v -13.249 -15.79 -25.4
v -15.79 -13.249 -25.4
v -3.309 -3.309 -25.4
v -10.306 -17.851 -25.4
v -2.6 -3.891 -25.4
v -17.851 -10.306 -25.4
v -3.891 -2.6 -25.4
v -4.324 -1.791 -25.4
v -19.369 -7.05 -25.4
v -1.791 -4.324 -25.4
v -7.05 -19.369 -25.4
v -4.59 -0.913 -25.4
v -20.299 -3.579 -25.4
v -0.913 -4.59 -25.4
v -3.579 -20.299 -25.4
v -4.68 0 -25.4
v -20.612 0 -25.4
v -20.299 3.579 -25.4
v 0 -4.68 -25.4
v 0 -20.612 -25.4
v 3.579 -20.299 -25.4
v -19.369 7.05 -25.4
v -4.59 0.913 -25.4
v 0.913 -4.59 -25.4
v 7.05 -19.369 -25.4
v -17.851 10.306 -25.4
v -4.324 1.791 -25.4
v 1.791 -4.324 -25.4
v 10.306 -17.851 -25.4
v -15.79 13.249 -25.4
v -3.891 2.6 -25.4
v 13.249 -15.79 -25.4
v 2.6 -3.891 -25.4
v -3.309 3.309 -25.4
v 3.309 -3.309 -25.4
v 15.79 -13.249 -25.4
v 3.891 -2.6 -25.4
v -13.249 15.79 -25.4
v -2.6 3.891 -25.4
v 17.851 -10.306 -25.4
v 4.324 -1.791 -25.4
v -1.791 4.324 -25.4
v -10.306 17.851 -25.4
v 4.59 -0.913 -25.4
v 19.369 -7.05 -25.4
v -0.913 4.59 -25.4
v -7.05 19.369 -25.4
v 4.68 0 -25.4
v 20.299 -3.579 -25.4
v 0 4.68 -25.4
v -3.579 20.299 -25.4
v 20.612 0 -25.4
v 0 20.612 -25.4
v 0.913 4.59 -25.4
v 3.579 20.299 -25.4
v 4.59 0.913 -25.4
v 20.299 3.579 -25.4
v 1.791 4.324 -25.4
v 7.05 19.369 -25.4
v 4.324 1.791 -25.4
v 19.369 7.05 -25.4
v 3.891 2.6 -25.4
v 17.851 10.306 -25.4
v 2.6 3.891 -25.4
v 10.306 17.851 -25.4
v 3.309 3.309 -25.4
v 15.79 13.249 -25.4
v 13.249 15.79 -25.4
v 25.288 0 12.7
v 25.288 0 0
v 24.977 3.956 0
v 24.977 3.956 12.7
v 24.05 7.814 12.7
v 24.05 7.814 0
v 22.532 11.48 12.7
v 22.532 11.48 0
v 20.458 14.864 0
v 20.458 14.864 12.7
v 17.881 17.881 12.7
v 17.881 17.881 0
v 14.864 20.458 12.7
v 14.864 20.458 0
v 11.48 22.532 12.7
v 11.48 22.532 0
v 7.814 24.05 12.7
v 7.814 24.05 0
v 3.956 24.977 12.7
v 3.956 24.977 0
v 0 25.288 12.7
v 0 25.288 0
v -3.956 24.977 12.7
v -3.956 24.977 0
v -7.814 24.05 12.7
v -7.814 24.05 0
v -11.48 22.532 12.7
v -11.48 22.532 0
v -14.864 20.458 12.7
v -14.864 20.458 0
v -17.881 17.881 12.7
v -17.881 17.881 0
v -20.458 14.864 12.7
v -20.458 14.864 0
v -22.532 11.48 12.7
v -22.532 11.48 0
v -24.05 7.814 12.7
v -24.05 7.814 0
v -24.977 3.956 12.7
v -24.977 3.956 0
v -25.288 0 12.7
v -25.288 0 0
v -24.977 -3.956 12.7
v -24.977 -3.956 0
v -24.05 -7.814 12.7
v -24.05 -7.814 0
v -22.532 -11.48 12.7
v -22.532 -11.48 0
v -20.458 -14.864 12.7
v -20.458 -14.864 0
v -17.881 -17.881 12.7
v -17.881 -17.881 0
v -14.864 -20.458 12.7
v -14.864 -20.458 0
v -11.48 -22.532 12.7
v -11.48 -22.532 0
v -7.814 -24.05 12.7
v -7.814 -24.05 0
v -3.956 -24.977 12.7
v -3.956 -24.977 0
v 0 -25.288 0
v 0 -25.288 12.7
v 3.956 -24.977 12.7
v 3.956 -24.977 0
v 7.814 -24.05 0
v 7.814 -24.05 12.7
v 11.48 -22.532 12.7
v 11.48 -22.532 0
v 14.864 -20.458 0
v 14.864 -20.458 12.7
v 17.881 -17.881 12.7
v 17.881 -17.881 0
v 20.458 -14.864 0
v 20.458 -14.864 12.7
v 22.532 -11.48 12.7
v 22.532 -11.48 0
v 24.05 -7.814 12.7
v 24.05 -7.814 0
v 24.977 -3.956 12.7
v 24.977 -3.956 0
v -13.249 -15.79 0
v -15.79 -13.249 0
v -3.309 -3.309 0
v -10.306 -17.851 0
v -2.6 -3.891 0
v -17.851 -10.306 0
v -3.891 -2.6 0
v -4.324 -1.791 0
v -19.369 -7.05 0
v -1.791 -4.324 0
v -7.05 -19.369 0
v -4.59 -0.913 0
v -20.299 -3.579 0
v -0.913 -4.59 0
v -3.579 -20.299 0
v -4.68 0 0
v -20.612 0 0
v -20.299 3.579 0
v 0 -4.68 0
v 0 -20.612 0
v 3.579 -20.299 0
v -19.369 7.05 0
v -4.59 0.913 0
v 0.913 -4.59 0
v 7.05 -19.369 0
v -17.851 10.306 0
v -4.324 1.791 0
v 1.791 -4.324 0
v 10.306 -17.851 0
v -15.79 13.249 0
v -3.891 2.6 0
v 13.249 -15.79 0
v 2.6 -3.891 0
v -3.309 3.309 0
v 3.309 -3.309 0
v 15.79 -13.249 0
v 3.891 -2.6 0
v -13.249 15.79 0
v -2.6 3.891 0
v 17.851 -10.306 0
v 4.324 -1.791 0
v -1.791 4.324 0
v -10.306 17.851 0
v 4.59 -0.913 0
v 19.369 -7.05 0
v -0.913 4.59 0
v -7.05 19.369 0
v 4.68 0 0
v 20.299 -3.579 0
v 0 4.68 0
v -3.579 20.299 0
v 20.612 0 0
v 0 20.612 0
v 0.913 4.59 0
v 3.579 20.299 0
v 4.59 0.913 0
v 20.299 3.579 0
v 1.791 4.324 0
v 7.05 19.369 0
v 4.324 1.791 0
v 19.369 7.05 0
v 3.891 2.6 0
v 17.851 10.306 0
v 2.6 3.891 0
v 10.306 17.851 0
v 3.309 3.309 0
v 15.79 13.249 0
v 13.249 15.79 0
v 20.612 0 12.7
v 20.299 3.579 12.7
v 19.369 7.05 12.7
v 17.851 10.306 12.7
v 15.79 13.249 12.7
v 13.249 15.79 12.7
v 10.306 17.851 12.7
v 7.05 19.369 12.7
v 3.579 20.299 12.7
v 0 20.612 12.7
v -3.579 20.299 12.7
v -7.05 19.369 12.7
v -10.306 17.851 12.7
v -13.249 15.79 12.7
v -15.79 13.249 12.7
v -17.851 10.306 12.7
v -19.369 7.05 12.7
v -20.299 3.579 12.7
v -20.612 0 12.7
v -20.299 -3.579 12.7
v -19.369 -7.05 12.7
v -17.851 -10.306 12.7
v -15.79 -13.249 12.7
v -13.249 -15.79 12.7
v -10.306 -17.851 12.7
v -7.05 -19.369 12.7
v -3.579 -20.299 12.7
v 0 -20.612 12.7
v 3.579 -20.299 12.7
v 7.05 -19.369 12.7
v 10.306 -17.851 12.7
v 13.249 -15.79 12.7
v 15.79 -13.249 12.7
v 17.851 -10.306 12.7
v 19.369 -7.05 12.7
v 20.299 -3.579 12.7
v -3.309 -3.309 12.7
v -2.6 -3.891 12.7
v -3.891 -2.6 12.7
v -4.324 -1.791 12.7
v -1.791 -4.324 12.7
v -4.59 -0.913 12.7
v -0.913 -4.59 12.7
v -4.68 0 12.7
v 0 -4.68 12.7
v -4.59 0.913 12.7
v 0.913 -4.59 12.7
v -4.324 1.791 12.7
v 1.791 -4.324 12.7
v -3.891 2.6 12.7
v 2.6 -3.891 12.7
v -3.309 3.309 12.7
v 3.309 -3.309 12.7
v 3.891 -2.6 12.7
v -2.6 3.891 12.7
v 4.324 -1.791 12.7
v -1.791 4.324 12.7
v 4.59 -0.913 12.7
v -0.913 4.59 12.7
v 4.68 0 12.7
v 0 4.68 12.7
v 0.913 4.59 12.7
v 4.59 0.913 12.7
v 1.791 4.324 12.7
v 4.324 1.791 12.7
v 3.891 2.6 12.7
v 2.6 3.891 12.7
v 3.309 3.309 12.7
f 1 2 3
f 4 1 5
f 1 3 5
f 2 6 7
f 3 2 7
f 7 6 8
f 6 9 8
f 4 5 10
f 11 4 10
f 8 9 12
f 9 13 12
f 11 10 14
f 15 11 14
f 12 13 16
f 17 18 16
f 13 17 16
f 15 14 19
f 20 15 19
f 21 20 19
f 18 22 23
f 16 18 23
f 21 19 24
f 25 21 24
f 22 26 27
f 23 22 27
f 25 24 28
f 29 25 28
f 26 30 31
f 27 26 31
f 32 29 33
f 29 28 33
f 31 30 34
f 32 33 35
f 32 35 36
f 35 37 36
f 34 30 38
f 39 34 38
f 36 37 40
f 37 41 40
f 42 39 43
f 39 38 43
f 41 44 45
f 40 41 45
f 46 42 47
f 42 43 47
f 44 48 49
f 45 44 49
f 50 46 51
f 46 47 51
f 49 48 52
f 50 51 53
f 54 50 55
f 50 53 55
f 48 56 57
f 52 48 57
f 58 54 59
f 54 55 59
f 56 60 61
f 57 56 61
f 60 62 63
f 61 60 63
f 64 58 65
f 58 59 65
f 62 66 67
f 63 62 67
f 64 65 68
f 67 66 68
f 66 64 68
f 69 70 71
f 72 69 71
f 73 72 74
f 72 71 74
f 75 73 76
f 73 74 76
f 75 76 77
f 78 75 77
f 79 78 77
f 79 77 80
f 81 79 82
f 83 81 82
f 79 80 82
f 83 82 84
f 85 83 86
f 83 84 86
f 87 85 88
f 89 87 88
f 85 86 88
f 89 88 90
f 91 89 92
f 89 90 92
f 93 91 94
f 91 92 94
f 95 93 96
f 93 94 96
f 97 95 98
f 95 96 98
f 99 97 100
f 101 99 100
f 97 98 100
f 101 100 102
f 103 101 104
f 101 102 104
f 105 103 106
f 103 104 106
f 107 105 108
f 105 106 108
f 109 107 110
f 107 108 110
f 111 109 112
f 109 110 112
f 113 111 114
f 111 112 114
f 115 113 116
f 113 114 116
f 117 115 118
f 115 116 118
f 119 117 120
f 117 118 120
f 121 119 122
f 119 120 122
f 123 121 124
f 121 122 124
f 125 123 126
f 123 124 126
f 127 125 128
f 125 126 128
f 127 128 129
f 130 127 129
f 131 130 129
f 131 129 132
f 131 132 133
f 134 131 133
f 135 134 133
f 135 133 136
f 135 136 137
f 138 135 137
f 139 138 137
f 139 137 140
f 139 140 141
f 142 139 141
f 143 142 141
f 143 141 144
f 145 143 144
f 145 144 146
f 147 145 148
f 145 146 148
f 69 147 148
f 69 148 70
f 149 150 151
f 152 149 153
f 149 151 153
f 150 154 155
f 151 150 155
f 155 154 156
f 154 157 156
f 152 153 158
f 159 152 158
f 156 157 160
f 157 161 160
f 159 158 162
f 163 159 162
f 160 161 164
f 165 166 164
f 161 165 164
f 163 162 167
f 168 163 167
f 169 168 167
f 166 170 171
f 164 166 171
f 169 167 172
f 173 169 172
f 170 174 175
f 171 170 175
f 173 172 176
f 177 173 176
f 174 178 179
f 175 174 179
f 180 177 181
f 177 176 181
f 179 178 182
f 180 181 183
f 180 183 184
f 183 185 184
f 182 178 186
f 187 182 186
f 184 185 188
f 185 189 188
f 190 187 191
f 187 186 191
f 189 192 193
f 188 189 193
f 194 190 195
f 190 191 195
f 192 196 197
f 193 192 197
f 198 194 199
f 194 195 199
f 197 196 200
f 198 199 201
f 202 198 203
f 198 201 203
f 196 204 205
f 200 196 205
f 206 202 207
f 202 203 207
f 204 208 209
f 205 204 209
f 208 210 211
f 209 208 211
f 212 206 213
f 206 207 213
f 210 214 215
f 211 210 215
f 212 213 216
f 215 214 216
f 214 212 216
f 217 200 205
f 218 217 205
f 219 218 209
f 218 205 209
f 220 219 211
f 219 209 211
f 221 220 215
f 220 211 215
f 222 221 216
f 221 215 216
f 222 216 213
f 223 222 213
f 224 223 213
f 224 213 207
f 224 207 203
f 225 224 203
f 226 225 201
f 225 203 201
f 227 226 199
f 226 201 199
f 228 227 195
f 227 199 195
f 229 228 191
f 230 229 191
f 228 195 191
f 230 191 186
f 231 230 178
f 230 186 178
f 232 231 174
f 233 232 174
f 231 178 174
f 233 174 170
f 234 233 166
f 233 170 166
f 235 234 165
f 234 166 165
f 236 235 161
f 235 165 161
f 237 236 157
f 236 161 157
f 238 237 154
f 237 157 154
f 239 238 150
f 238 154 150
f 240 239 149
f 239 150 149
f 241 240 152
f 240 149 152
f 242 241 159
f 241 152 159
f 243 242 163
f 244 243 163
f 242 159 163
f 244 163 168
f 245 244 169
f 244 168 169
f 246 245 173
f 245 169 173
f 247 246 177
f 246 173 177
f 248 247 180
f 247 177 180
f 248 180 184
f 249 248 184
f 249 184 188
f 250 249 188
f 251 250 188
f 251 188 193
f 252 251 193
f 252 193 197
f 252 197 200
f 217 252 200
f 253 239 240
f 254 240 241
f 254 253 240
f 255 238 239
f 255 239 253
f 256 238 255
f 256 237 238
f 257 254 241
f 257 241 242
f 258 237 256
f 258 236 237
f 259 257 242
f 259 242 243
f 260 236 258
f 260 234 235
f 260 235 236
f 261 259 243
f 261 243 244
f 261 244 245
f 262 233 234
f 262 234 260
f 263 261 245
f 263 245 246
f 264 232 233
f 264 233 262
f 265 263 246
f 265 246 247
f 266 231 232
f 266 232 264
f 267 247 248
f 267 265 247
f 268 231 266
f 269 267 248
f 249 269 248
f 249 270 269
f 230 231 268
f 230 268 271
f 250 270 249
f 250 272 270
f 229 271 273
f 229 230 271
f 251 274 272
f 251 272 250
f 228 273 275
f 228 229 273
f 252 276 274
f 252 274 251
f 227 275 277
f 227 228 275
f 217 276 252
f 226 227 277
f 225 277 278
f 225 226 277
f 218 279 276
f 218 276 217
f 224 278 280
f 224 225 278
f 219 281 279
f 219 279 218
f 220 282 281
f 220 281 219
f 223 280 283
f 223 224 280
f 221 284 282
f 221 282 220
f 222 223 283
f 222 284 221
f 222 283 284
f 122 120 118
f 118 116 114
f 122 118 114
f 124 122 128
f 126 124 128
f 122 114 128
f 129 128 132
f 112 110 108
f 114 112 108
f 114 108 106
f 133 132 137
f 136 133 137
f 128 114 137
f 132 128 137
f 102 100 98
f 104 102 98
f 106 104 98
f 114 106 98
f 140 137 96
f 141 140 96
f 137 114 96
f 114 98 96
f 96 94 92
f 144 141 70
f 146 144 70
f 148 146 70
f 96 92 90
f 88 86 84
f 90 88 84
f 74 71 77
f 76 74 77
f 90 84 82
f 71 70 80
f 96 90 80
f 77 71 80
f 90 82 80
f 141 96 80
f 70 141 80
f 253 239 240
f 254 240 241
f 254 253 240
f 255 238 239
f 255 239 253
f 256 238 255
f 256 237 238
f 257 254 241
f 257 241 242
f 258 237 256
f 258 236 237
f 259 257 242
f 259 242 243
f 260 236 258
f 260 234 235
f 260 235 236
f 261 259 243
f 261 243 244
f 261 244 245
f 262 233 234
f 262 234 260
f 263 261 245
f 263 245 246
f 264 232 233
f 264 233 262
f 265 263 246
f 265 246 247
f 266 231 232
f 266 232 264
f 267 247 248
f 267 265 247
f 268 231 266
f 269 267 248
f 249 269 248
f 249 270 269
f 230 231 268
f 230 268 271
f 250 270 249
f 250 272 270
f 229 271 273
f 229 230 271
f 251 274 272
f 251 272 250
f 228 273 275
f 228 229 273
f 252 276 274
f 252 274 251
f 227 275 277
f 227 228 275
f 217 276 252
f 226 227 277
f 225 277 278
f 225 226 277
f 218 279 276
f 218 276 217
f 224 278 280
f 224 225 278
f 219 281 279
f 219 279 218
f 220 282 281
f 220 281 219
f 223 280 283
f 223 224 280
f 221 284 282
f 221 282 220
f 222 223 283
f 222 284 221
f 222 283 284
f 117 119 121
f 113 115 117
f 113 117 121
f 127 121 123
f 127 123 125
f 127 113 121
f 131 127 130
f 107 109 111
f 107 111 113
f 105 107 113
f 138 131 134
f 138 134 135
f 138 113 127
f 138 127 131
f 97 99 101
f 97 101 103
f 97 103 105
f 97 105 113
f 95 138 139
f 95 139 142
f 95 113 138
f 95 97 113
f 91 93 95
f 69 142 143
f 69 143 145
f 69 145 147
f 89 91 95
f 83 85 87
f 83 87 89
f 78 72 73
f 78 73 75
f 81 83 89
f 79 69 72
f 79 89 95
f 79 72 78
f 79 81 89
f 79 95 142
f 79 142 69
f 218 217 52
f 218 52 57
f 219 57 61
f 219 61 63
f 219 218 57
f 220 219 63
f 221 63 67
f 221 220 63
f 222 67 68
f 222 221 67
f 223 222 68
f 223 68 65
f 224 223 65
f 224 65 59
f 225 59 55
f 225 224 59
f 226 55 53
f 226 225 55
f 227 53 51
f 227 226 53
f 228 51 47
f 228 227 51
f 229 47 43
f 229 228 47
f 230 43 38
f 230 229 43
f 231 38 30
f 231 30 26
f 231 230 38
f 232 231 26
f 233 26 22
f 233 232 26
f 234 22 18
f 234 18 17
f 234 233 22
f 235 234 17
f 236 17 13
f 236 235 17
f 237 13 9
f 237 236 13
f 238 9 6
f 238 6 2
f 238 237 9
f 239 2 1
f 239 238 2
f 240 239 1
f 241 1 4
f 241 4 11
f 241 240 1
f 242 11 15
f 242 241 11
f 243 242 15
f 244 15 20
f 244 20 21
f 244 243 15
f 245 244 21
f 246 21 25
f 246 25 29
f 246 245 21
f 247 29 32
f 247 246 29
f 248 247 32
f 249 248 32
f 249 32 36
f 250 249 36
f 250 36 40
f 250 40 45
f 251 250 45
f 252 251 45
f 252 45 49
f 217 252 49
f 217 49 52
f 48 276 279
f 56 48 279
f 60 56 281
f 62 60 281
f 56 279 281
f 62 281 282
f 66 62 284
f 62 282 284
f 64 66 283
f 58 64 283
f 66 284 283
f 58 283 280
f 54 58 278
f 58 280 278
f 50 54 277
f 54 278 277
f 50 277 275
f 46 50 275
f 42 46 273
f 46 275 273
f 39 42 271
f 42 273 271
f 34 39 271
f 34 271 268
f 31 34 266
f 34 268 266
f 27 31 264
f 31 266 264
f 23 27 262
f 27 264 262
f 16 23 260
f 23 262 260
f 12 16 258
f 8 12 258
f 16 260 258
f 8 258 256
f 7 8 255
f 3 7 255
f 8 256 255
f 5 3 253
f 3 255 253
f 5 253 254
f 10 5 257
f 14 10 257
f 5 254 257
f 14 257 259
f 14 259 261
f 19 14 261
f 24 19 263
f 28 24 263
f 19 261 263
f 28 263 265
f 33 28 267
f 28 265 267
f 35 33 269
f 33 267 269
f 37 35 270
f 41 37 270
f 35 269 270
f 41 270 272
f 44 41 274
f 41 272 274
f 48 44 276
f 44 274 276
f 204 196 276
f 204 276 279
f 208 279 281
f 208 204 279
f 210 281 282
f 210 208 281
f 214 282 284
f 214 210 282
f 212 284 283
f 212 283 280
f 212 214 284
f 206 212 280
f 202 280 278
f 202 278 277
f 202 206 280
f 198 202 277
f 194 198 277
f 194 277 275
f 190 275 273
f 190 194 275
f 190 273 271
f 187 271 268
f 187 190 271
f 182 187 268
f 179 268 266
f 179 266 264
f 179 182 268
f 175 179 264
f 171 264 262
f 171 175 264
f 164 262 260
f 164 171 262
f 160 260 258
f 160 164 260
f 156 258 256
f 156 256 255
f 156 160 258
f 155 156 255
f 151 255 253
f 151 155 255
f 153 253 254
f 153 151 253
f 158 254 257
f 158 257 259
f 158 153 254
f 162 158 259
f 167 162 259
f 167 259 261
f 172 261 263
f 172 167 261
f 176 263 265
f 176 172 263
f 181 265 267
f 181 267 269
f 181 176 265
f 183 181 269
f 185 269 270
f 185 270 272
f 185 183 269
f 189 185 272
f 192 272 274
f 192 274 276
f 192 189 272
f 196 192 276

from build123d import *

# Parameters (mm, degrees)
F0_R     = 25.287927835
F0_R_2   = 25.2654785995
F2_DEPTH = 12.7
F1_R     = 20.6121053544
F1_R_2   = 4.679734569
F3_DEPTH = 38.1


# Not quite as in the source:
# - a feature of the source that left no trace in its solid (it failed there, or was rolled back) is left out
# - a feature names something its author has since deleted; it is built from what else it names


with BuildPart() as f2:
    # F0 (on Top) → F2 (new body)
    with BuildSketch(Plane.XY):
        Circle(F0_R)
        Circle(F0_R_2, mode=Mode.SUBTRACT)
        Circle(F0_R_2)
    extrude(amount=F2_DEPTH)


with BuildPart() as f2b:
    # F1 (on Top) → F2, piece 2 (new body)
    with BuildSketch(Plane.XY):
        Circle(F1_R)
        Circle(F1_R_2, mode=Mode.SUBTRACT)
    extrude(amount=F2_DEPTH)


with BuildPart() as f3:
    # F3 (new): a face of the model
    f3_faces = [f2b.part.faces().sort_by_distance(p)[0] for p in [
        (-20.0291069756, 0, 12.7),
    ]]
    extrude(f3_faces, amount=-F3_DEPTH)


solid = Compound([f2.part, f2b.part, f3.part])
